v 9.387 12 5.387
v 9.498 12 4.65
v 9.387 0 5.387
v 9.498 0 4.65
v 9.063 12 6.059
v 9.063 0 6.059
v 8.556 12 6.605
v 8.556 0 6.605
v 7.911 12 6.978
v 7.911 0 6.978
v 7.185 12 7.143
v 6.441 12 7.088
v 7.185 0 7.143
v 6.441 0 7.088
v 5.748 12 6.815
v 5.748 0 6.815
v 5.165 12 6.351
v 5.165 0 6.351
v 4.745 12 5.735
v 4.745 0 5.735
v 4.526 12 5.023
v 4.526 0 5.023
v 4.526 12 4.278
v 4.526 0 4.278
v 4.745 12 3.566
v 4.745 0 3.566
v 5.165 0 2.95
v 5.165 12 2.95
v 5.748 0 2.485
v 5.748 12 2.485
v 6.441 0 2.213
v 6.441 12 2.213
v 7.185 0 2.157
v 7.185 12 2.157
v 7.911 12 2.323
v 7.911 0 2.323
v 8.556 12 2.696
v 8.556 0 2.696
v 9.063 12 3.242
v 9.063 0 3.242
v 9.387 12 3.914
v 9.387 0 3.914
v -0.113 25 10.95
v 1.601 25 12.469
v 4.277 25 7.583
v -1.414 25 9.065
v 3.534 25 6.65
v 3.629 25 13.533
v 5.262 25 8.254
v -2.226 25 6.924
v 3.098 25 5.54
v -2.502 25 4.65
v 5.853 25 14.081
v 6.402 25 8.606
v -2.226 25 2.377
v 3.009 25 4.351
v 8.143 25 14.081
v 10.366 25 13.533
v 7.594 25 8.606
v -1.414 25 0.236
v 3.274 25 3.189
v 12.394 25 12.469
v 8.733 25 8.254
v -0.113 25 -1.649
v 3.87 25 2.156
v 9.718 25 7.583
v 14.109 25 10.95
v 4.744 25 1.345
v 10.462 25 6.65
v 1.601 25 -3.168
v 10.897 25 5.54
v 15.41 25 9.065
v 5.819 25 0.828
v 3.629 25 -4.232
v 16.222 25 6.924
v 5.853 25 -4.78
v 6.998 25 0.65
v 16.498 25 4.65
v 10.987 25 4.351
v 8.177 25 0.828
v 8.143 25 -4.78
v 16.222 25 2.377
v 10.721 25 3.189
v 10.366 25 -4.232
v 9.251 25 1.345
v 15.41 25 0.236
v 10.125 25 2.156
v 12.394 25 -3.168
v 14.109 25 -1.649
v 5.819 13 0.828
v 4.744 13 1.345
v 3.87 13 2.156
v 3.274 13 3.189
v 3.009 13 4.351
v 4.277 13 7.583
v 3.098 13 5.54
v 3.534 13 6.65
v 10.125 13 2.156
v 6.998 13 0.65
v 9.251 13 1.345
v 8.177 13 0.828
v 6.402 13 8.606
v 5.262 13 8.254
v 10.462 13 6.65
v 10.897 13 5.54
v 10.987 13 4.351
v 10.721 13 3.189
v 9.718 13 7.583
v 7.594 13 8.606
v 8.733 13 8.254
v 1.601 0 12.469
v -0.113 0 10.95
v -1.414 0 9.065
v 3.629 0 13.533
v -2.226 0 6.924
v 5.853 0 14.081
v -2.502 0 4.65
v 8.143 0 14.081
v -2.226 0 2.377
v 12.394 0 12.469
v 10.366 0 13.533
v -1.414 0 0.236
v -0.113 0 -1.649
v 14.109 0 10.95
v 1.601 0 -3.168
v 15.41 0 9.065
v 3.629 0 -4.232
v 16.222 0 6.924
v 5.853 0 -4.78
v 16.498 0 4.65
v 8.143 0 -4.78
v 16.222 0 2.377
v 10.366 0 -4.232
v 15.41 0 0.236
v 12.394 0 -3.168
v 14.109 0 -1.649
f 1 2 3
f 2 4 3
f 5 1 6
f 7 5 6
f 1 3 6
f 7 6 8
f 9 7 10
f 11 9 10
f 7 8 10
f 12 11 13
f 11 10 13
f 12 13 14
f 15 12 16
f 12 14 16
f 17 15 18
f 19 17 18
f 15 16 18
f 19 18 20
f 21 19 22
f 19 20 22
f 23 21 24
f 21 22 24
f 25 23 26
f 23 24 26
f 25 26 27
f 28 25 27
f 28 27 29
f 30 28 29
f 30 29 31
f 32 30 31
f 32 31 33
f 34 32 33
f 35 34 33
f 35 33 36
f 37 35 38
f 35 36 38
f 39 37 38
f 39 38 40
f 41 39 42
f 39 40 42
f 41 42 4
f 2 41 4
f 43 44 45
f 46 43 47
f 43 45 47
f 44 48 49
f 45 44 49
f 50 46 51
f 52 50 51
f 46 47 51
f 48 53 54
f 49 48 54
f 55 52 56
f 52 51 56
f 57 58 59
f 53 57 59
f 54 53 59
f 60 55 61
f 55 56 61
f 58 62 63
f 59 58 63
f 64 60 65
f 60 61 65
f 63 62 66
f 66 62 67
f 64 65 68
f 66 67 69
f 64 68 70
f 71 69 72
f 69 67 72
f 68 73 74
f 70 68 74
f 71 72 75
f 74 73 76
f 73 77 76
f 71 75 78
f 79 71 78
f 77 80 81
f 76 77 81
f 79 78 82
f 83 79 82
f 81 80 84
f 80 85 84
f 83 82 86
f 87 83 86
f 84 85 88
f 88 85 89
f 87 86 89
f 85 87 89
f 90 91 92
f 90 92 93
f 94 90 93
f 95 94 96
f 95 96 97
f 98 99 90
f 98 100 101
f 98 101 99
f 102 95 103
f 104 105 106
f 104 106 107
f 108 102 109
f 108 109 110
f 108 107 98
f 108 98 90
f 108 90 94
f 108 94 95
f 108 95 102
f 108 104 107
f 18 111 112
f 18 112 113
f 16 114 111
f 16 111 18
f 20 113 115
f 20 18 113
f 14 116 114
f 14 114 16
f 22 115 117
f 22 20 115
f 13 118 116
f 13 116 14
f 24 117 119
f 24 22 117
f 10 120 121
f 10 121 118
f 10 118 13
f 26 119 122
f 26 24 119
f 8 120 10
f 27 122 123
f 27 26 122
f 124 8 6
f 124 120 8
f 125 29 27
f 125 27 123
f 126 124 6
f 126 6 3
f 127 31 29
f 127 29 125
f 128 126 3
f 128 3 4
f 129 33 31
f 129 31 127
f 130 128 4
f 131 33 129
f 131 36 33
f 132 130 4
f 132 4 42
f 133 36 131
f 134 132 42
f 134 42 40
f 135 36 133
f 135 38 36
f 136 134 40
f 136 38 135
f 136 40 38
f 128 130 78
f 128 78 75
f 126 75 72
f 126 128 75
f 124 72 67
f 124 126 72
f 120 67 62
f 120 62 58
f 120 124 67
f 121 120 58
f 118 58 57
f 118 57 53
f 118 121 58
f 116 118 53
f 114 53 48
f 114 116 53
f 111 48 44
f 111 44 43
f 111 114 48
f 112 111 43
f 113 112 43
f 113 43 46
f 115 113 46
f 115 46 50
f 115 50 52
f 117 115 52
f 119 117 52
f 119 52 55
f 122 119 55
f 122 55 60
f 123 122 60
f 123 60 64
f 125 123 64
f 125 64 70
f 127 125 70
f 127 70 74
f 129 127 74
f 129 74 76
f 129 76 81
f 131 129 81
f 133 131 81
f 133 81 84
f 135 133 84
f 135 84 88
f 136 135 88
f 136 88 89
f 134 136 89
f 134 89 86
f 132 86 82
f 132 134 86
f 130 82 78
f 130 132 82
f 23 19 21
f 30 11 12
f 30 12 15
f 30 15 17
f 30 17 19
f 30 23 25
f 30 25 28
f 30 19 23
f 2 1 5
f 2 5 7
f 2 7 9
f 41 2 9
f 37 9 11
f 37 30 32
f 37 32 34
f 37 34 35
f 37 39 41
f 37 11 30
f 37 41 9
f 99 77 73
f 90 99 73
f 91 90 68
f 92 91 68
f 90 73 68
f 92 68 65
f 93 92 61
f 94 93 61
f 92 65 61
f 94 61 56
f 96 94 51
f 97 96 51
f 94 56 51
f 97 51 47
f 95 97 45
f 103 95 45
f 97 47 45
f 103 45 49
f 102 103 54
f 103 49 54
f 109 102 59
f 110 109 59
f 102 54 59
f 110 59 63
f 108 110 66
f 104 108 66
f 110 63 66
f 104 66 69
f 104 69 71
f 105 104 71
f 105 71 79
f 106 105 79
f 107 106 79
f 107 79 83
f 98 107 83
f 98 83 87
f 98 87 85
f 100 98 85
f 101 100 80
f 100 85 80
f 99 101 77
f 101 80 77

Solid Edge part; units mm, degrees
sketch "Sketch1" plane through (0, 0, 0) normal (0, -1, 0) x (1, 0, 0)
  circle A0 centre (6.9977, 4.6504) radius 9.5
extrude "Protrusion1" add sketch "Sketch1" against normal blind 25
sketch "Sketch2" plane through (6.9977, 0, 4.6504) normal (0, -1, 0) x (1, 0, 0)
  circle A0 centre (0, 0) radius 2.5
extrude "VaciadoExtruido_1" cut sketch "Sketch2" against normal blind 12
sketch "Sketch3" plane through (6.9977, 25, 4.6504) normal (0, 1, 0) x (0, 0, -1)
  circle A0 centre (0, 0) radius 4
extrude "VaciadoExtruido_2" cut sketch "Sketch3" against normal blind 12
